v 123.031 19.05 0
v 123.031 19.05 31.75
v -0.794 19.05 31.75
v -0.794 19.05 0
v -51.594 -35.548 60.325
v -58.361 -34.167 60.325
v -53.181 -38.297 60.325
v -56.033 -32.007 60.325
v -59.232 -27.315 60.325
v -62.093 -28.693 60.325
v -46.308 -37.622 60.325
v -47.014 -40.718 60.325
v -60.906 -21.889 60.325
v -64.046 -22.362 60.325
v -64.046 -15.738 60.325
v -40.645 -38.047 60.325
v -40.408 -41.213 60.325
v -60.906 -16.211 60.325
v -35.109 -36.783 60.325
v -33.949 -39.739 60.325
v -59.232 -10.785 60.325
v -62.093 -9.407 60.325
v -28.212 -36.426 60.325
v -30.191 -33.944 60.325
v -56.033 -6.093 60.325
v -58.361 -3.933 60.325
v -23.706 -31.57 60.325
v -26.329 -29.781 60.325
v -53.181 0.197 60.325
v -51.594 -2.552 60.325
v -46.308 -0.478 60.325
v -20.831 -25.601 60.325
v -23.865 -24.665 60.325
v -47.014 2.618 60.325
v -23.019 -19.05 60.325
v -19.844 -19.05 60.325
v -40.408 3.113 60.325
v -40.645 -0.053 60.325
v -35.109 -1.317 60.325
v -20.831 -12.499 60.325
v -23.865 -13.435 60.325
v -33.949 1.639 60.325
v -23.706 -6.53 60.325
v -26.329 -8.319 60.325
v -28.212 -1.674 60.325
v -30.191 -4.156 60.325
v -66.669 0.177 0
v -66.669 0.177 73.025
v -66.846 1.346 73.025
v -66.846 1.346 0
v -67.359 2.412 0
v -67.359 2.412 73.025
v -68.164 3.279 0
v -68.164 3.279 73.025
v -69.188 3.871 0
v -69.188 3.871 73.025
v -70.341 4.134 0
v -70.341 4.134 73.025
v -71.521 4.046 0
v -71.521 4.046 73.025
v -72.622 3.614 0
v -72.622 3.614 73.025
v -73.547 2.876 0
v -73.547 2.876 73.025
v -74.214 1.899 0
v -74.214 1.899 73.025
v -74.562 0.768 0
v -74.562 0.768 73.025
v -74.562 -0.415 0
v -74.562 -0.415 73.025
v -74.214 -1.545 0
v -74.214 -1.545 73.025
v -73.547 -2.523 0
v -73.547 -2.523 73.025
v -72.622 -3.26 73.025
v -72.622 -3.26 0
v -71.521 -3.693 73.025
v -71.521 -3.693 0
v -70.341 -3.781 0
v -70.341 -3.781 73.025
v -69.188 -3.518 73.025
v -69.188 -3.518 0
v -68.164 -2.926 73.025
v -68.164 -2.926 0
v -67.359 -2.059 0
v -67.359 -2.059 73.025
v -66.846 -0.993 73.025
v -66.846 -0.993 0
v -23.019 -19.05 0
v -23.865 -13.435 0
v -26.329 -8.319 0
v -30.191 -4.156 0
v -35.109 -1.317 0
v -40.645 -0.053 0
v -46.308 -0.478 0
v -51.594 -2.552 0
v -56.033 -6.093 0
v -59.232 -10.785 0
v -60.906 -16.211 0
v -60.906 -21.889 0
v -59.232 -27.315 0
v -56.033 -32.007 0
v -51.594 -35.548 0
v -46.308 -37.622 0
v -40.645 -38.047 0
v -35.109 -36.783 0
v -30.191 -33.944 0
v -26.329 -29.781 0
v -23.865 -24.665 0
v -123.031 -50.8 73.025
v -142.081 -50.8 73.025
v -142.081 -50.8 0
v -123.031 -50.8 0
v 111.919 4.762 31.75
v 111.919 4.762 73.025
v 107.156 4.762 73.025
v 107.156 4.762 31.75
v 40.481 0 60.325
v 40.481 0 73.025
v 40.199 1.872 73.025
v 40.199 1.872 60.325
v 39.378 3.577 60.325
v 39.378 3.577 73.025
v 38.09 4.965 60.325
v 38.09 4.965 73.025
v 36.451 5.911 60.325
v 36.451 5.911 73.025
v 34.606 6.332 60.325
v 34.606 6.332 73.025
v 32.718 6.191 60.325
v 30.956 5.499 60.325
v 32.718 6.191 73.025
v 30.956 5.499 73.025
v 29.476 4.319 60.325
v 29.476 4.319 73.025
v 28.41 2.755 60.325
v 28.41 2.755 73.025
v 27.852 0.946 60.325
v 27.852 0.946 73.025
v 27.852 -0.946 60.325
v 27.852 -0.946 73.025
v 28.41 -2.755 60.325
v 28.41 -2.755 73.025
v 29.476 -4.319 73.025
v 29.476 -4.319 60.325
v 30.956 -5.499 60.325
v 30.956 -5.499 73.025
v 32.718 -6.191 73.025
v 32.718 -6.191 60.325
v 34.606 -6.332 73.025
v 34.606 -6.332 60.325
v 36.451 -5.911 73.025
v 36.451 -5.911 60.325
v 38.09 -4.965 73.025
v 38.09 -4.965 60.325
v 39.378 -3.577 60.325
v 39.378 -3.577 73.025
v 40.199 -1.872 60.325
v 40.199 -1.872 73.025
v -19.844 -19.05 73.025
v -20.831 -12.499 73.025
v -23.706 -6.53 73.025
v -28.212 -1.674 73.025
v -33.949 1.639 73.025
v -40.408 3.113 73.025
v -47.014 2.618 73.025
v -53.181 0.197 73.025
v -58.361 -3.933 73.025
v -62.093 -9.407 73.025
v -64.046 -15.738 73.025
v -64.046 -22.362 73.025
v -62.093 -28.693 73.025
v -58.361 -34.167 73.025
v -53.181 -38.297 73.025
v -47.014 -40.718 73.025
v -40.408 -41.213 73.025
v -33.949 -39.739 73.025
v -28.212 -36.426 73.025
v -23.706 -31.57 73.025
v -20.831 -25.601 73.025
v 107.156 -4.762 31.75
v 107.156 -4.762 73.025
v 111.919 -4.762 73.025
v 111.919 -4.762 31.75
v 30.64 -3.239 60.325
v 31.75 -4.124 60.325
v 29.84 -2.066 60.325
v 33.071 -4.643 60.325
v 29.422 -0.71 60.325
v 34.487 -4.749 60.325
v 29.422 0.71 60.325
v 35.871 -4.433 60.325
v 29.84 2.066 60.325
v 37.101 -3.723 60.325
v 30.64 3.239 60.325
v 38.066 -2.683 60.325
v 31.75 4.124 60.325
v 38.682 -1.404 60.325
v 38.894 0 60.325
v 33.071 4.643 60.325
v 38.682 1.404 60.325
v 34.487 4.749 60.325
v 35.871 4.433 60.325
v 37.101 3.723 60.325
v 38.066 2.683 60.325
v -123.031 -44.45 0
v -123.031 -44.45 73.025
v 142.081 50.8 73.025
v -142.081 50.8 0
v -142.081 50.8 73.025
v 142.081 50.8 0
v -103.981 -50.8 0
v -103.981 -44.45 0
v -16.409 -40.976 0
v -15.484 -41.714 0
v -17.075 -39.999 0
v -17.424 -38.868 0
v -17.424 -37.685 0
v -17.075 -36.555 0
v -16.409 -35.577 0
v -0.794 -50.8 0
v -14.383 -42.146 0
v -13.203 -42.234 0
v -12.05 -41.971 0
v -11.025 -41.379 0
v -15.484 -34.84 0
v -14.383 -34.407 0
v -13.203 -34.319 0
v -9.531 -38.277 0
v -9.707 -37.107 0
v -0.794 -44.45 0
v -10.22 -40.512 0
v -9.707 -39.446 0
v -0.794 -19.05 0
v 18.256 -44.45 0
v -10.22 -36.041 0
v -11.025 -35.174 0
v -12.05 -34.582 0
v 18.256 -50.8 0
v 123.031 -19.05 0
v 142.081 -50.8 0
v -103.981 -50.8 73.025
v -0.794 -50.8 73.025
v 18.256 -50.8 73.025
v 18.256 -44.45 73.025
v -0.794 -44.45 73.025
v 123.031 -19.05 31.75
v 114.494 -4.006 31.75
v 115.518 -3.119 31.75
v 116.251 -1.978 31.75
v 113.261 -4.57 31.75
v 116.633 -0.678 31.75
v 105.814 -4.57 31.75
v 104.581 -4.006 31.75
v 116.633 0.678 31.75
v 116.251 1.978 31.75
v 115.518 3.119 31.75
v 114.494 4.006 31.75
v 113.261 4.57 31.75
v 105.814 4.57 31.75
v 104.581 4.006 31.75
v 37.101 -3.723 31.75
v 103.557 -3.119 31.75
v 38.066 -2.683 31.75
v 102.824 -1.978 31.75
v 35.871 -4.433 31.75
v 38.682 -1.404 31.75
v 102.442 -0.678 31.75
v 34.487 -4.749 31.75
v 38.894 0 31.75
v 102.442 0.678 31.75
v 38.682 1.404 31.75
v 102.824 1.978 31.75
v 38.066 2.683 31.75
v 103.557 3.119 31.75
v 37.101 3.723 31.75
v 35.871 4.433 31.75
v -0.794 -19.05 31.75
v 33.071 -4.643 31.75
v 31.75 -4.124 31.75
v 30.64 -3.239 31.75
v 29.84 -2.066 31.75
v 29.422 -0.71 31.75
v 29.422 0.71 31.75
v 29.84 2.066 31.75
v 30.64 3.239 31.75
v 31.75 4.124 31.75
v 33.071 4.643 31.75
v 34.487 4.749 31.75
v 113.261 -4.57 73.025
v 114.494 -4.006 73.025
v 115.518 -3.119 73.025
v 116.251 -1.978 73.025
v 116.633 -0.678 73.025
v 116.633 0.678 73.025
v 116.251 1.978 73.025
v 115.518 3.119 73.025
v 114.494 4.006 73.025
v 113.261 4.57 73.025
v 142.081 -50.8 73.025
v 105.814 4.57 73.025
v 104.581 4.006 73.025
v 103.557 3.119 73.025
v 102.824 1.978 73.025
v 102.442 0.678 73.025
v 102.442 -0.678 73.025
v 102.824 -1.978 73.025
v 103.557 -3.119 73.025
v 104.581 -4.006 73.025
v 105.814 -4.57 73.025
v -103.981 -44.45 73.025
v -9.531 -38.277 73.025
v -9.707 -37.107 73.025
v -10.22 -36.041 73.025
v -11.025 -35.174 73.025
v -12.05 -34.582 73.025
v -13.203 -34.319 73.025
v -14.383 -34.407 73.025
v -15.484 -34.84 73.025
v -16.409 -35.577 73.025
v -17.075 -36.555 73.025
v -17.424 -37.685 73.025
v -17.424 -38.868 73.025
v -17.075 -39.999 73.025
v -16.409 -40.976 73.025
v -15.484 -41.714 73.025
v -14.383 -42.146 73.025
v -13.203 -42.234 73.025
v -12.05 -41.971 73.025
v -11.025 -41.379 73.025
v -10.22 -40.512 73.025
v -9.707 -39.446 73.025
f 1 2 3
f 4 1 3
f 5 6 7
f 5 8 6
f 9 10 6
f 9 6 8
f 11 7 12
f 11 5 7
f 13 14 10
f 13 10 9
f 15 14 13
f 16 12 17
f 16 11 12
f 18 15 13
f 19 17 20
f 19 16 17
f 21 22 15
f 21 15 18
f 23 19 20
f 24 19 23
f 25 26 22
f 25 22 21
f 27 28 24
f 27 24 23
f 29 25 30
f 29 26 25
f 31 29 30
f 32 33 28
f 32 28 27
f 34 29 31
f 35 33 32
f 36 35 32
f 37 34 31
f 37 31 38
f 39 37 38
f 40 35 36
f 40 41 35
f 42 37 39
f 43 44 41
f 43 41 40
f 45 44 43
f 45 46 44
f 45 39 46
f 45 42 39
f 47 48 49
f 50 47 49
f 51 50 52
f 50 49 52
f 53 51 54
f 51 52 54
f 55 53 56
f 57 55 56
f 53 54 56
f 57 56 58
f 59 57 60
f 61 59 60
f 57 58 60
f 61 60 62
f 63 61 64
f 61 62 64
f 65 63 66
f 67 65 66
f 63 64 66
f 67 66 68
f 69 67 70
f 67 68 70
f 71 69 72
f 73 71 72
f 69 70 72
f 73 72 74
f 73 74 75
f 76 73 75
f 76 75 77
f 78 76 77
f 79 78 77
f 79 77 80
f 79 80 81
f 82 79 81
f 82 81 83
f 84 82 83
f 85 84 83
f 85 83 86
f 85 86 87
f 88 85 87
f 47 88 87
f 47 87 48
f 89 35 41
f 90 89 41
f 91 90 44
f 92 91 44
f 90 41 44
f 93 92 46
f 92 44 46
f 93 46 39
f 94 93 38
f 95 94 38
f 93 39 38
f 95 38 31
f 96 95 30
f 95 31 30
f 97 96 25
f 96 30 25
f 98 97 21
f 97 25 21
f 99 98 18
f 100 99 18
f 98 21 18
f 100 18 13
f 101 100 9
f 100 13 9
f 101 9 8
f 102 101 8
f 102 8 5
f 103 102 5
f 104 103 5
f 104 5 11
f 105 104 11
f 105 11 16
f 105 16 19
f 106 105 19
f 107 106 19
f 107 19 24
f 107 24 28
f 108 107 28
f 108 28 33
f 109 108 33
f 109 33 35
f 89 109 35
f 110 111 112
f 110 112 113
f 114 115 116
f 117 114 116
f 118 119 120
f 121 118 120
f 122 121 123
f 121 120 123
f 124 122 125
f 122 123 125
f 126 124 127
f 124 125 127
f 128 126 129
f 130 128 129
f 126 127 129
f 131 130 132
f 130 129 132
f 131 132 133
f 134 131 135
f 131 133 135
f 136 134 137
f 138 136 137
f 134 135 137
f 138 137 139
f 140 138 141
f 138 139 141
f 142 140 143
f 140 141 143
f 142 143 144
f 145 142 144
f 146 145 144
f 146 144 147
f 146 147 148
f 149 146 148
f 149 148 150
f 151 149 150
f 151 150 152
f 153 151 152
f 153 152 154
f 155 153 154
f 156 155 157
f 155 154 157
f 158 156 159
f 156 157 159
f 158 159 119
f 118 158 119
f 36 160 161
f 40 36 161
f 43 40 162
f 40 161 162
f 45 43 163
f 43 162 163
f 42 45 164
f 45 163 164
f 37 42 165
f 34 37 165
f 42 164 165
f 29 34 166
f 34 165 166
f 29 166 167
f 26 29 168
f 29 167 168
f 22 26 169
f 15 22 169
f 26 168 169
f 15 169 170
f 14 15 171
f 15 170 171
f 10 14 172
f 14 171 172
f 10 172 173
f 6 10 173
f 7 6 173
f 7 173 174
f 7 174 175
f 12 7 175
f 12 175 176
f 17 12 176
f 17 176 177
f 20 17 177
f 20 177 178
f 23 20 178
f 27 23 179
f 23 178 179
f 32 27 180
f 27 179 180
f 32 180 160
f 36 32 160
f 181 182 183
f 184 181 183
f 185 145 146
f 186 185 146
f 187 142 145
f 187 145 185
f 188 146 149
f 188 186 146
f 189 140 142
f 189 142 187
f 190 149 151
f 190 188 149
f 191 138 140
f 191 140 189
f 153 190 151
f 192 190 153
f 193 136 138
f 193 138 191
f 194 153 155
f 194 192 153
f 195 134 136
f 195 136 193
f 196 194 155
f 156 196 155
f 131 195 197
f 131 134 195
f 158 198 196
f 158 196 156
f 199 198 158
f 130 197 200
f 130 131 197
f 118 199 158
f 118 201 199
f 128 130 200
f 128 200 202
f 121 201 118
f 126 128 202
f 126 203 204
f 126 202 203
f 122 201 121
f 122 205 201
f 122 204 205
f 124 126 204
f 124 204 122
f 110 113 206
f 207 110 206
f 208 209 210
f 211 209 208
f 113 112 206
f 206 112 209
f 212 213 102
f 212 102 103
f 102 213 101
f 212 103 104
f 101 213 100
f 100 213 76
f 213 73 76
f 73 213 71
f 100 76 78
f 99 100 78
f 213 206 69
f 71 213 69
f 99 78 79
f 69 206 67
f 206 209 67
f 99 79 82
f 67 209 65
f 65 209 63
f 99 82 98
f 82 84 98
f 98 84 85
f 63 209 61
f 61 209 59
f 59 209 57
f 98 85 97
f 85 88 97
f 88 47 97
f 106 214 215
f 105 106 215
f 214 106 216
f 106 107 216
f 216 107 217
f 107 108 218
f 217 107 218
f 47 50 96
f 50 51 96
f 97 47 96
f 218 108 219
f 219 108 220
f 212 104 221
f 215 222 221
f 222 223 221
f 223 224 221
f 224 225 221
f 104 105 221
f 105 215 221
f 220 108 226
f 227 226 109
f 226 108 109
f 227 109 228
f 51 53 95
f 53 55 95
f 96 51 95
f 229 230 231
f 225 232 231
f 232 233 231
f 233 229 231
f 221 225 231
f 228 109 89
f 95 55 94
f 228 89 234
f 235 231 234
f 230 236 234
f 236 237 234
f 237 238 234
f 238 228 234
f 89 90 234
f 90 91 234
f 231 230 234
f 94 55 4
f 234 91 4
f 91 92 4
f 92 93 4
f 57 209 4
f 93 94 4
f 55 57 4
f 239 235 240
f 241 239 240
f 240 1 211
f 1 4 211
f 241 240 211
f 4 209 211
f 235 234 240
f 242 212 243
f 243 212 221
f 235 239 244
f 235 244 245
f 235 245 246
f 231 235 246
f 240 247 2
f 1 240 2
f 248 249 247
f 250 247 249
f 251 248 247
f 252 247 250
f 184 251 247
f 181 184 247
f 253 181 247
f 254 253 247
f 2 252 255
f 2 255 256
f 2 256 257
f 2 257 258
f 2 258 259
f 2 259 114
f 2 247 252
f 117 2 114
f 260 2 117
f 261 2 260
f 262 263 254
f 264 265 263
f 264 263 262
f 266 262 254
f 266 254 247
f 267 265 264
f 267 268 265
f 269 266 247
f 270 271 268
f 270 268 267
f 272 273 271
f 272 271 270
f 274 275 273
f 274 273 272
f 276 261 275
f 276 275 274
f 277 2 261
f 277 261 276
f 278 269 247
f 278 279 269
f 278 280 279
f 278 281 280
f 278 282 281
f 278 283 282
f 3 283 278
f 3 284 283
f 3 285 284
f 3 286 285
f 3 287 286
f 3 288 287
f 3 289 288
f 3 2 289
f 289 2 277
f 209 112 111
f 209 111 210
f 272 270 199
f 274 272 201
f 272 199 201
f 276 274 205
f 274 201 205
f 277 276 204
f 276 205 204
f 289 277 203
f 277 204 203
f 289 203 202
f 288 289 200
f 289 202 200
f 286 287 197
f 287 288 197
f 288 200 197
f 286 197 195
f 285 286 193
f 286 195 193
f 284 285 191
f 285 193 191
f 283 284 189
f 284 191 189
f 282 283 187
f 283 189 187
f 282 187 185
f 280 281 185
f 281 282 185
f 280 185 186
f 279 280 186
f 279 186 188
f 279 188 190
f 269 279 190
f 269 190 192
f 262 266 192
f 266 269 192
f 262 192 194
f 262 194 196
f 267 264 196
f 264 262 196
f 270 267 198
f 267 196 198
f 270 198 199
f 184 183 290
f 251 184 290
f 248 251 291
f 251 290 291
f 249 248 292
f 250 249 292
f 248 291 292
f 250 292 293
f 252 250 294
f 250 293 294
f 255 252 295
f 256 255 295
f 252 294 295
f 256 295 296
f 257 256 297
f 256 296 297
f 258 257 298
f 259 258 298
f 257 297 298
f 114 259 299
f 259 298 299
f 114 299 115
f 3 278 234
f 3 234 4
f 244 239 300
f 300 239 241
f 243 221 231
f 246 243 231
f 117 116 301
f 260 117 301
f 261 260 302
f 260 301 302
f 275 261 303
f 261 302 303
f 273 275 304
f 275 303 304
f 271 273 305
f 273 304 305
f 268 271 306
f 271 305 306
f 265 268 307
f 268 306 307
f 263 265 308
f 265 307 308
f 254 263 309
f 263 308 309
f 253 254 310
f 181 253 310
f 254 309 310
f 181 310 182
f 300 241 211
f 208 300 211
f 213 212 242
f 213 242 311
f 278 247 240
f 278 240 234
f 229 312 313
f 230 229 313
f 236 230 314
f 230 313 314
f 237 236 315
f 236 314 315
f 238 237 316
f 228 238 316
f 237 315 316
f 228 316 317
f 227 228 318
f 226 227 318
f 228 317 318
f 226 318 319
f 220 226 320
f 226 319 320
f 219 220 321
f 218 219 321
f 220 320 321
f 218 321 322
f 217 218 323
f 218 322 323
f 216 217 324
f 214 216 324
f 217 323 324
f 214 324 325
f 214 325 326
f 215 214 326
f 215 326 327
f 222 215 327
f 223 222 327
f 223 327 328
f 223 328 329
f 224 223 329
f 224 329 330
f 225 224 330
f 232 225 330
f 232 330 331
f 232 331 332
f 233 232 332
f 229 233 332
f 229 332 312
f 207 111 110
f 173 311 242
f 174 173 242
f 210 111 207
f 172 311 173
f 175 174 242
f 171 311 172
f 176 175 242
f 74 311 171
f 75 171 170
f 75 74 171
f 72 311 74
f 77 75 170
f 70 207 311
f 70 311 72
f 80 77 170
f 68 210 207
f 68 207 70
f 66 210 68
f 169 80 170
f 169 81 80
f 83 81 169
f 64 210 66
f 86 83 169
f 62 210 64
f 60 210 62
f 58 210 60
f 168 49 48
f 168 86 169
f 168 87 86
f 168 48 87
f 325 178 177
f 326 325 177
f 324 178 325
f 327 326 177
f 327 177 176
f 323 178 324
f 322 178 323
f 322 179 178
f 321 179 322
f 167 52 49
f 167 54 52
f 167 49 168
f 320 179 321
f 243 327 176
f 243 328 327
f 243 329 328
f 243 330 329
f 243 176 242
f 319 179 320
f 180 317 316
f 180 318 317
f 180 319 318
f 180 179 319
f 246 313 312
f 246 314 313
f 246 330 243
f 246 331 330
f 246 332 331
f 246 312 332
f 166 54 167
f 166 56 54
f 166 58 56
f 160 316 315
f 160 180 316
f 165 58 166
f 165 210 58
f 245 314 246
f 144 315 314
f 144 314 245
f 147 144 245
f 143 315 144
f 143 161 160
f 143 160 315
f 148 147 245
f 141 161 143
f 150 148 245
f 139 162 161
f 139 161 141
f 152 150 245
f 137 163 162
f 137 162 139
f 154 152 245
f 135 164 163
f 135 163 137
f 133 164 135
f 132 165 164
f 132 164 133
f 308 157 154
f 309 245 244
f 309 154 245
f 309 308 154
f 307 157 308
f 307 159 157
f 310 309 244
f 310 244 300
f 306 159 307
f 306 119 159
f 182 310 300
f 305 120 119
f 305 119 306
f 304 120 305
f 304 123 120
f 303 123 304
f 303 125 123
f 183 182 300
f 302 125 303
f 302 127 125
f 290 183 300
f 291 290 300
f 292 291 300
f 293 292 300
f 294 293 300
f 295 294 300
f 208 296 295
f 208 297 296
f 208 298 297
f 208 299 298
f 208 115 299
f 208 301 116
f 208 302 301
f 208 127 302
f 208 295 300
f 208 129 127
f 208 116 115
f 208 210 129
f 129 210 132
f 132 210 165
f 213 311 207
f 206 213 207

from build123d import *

# Parameters (mm, degrees)
SKETCH1_W           = 284.1625
SKETCH1_H           = 101.6
BOSS_EXTRUDE1_DEPTH = 73.025
SKETCH2_R           = 19.05
SKETCH2_R_2         = 4.7625
SKETCH2_R_3         = 3.96875
CUT_EXTRUDE1_DEPTH  = 168.631656397
SKETCH2_3_R         = 22.225
SKETCH2_3_R_2       = 6.35
CUT_EXTRUDE2_DEPTH  = 12.7
CUT_EXTRUDE3_START  = -31.75
SKETCH3_W           = 123.825
SKETCH3_H           = 38.1
SKETCH3_R           = 4.7625
CUT_EXTRUDE3_DEPTH  = 31.75
SKETCH3_3_W         = 19.05
SKETCH3_3_H         = 6.35
CUT_EXTRUDE4_DEPTH  = 168.631656397


with BuildPart() as part:
    # Sketch1 → Boss-Extrude1 (new body)
    with BuildSketch(Plane.XY):
        Rectangle(SKETCH1_W, SKETCH1_H)
    extrude(amount=BOSS_EXTRUDE1_DEPTH)

    # Sketch2 → Cut-Extrude1 (cut, through all)
    with BuildSketch(Plane.XY.offset(73.025)):
        with BuildLine():
            Line((111.91875, 4.7625), (107.15625, 4.7625))
            ThreePointArc((107.15625, 4.7625), (102.39375, 0), (107.15625, -4.7625))
            Line((107.15625, -4.7625), (111.91875, -4.7625))
            ThreePointArc((111.91875, -4.7625), (116.68125, 0), (111.91875, 4.7625))
        make_face()
        with Locations((-42.06875, -19.05)):
            Circle(SKETCH2_R)
        with Locations((34.13125, 0)):
            Circle(SKETCH2_R_2)
        with Locations((-13.499467703, -38.276580456)):
            Circle(SKETCH2_R_3)
        with Locations((-70.638032297, 0.176580456)):
            Circle(SKETCH2_R_3)
    extrude(amount=-CUT_EXTRUDE1_DEPTH, mode=Mode.SUBTRACT)

    # Sketch2<3> → Cut-Extrude2 (cut)
    with BuildSketch(Plane.XY.offset(73.025)):
        with Locations((-42.06875, -19.05)):
            Circle(SKETCH2_3_R)
        with Locations((34.13125, 0)):
            Circle(SKETCH2_3_R_2)
    extrude(amount=-CUT_EXTRUDE2_DEPTH, mode=Mode.SUBTRACT)

    # Sketch3 → Cut-Extrude3 (cut)
    with BuildSketch(Plane(origin=(0, 0, 0), x_dir=(-1, 0, 0), z_dir=(0, 0, -1)).offset(CUT_EXTRUDE3_START)):
        with Locations((-61.11875, 0)):
            Rectangle(SKETCH3_W, SKETCH3_H)
        with BuildLine():
            ThreePointArc((-107.15625, 4.7625), (-102.39375, 0), (-107.15625, -4.7625))
            Line((-107.15625, -4.7625), (-111.91875, -4.7625))
            ThreePointArc((-111.91875, -4.7625), (-116.68125, 0), (-111.91875, 4.7625))
            Line((-111.91875, 4.7625), (-107.15625, 4.7625))
        make_face(mode=Mode.SUBTRACT)
        with Locations((-34.13125, 0)):
            Circle(SKETCH3_R, mode=Mode.SUBTRACT)
    extrude(amount=CUT_EXTRUDE3_DEPTH, mode=Mode.SUBTRACT)

    # Sketch3<3> → Cut-Extrude4 (cut, through all)
    with BuildSketch(Plane(origin=(0, 0, 0), x_dir=(-1, 0, 0), z_dir=(0, 0, -1))):
        with Locations((-8.73125, -47.625)):
            Rectangle(SKETCH3_3_W, SKETCH3_3_H)
        with Locations((113.50625, -47.625)):
            Rectangle(SKETCH3_3_W, SKETCH3_3_H)
    extrude(amount=-CUT_EXTRUDE4_DEPTH, mode=Mode.SUBTRACT)


solid = part.part
